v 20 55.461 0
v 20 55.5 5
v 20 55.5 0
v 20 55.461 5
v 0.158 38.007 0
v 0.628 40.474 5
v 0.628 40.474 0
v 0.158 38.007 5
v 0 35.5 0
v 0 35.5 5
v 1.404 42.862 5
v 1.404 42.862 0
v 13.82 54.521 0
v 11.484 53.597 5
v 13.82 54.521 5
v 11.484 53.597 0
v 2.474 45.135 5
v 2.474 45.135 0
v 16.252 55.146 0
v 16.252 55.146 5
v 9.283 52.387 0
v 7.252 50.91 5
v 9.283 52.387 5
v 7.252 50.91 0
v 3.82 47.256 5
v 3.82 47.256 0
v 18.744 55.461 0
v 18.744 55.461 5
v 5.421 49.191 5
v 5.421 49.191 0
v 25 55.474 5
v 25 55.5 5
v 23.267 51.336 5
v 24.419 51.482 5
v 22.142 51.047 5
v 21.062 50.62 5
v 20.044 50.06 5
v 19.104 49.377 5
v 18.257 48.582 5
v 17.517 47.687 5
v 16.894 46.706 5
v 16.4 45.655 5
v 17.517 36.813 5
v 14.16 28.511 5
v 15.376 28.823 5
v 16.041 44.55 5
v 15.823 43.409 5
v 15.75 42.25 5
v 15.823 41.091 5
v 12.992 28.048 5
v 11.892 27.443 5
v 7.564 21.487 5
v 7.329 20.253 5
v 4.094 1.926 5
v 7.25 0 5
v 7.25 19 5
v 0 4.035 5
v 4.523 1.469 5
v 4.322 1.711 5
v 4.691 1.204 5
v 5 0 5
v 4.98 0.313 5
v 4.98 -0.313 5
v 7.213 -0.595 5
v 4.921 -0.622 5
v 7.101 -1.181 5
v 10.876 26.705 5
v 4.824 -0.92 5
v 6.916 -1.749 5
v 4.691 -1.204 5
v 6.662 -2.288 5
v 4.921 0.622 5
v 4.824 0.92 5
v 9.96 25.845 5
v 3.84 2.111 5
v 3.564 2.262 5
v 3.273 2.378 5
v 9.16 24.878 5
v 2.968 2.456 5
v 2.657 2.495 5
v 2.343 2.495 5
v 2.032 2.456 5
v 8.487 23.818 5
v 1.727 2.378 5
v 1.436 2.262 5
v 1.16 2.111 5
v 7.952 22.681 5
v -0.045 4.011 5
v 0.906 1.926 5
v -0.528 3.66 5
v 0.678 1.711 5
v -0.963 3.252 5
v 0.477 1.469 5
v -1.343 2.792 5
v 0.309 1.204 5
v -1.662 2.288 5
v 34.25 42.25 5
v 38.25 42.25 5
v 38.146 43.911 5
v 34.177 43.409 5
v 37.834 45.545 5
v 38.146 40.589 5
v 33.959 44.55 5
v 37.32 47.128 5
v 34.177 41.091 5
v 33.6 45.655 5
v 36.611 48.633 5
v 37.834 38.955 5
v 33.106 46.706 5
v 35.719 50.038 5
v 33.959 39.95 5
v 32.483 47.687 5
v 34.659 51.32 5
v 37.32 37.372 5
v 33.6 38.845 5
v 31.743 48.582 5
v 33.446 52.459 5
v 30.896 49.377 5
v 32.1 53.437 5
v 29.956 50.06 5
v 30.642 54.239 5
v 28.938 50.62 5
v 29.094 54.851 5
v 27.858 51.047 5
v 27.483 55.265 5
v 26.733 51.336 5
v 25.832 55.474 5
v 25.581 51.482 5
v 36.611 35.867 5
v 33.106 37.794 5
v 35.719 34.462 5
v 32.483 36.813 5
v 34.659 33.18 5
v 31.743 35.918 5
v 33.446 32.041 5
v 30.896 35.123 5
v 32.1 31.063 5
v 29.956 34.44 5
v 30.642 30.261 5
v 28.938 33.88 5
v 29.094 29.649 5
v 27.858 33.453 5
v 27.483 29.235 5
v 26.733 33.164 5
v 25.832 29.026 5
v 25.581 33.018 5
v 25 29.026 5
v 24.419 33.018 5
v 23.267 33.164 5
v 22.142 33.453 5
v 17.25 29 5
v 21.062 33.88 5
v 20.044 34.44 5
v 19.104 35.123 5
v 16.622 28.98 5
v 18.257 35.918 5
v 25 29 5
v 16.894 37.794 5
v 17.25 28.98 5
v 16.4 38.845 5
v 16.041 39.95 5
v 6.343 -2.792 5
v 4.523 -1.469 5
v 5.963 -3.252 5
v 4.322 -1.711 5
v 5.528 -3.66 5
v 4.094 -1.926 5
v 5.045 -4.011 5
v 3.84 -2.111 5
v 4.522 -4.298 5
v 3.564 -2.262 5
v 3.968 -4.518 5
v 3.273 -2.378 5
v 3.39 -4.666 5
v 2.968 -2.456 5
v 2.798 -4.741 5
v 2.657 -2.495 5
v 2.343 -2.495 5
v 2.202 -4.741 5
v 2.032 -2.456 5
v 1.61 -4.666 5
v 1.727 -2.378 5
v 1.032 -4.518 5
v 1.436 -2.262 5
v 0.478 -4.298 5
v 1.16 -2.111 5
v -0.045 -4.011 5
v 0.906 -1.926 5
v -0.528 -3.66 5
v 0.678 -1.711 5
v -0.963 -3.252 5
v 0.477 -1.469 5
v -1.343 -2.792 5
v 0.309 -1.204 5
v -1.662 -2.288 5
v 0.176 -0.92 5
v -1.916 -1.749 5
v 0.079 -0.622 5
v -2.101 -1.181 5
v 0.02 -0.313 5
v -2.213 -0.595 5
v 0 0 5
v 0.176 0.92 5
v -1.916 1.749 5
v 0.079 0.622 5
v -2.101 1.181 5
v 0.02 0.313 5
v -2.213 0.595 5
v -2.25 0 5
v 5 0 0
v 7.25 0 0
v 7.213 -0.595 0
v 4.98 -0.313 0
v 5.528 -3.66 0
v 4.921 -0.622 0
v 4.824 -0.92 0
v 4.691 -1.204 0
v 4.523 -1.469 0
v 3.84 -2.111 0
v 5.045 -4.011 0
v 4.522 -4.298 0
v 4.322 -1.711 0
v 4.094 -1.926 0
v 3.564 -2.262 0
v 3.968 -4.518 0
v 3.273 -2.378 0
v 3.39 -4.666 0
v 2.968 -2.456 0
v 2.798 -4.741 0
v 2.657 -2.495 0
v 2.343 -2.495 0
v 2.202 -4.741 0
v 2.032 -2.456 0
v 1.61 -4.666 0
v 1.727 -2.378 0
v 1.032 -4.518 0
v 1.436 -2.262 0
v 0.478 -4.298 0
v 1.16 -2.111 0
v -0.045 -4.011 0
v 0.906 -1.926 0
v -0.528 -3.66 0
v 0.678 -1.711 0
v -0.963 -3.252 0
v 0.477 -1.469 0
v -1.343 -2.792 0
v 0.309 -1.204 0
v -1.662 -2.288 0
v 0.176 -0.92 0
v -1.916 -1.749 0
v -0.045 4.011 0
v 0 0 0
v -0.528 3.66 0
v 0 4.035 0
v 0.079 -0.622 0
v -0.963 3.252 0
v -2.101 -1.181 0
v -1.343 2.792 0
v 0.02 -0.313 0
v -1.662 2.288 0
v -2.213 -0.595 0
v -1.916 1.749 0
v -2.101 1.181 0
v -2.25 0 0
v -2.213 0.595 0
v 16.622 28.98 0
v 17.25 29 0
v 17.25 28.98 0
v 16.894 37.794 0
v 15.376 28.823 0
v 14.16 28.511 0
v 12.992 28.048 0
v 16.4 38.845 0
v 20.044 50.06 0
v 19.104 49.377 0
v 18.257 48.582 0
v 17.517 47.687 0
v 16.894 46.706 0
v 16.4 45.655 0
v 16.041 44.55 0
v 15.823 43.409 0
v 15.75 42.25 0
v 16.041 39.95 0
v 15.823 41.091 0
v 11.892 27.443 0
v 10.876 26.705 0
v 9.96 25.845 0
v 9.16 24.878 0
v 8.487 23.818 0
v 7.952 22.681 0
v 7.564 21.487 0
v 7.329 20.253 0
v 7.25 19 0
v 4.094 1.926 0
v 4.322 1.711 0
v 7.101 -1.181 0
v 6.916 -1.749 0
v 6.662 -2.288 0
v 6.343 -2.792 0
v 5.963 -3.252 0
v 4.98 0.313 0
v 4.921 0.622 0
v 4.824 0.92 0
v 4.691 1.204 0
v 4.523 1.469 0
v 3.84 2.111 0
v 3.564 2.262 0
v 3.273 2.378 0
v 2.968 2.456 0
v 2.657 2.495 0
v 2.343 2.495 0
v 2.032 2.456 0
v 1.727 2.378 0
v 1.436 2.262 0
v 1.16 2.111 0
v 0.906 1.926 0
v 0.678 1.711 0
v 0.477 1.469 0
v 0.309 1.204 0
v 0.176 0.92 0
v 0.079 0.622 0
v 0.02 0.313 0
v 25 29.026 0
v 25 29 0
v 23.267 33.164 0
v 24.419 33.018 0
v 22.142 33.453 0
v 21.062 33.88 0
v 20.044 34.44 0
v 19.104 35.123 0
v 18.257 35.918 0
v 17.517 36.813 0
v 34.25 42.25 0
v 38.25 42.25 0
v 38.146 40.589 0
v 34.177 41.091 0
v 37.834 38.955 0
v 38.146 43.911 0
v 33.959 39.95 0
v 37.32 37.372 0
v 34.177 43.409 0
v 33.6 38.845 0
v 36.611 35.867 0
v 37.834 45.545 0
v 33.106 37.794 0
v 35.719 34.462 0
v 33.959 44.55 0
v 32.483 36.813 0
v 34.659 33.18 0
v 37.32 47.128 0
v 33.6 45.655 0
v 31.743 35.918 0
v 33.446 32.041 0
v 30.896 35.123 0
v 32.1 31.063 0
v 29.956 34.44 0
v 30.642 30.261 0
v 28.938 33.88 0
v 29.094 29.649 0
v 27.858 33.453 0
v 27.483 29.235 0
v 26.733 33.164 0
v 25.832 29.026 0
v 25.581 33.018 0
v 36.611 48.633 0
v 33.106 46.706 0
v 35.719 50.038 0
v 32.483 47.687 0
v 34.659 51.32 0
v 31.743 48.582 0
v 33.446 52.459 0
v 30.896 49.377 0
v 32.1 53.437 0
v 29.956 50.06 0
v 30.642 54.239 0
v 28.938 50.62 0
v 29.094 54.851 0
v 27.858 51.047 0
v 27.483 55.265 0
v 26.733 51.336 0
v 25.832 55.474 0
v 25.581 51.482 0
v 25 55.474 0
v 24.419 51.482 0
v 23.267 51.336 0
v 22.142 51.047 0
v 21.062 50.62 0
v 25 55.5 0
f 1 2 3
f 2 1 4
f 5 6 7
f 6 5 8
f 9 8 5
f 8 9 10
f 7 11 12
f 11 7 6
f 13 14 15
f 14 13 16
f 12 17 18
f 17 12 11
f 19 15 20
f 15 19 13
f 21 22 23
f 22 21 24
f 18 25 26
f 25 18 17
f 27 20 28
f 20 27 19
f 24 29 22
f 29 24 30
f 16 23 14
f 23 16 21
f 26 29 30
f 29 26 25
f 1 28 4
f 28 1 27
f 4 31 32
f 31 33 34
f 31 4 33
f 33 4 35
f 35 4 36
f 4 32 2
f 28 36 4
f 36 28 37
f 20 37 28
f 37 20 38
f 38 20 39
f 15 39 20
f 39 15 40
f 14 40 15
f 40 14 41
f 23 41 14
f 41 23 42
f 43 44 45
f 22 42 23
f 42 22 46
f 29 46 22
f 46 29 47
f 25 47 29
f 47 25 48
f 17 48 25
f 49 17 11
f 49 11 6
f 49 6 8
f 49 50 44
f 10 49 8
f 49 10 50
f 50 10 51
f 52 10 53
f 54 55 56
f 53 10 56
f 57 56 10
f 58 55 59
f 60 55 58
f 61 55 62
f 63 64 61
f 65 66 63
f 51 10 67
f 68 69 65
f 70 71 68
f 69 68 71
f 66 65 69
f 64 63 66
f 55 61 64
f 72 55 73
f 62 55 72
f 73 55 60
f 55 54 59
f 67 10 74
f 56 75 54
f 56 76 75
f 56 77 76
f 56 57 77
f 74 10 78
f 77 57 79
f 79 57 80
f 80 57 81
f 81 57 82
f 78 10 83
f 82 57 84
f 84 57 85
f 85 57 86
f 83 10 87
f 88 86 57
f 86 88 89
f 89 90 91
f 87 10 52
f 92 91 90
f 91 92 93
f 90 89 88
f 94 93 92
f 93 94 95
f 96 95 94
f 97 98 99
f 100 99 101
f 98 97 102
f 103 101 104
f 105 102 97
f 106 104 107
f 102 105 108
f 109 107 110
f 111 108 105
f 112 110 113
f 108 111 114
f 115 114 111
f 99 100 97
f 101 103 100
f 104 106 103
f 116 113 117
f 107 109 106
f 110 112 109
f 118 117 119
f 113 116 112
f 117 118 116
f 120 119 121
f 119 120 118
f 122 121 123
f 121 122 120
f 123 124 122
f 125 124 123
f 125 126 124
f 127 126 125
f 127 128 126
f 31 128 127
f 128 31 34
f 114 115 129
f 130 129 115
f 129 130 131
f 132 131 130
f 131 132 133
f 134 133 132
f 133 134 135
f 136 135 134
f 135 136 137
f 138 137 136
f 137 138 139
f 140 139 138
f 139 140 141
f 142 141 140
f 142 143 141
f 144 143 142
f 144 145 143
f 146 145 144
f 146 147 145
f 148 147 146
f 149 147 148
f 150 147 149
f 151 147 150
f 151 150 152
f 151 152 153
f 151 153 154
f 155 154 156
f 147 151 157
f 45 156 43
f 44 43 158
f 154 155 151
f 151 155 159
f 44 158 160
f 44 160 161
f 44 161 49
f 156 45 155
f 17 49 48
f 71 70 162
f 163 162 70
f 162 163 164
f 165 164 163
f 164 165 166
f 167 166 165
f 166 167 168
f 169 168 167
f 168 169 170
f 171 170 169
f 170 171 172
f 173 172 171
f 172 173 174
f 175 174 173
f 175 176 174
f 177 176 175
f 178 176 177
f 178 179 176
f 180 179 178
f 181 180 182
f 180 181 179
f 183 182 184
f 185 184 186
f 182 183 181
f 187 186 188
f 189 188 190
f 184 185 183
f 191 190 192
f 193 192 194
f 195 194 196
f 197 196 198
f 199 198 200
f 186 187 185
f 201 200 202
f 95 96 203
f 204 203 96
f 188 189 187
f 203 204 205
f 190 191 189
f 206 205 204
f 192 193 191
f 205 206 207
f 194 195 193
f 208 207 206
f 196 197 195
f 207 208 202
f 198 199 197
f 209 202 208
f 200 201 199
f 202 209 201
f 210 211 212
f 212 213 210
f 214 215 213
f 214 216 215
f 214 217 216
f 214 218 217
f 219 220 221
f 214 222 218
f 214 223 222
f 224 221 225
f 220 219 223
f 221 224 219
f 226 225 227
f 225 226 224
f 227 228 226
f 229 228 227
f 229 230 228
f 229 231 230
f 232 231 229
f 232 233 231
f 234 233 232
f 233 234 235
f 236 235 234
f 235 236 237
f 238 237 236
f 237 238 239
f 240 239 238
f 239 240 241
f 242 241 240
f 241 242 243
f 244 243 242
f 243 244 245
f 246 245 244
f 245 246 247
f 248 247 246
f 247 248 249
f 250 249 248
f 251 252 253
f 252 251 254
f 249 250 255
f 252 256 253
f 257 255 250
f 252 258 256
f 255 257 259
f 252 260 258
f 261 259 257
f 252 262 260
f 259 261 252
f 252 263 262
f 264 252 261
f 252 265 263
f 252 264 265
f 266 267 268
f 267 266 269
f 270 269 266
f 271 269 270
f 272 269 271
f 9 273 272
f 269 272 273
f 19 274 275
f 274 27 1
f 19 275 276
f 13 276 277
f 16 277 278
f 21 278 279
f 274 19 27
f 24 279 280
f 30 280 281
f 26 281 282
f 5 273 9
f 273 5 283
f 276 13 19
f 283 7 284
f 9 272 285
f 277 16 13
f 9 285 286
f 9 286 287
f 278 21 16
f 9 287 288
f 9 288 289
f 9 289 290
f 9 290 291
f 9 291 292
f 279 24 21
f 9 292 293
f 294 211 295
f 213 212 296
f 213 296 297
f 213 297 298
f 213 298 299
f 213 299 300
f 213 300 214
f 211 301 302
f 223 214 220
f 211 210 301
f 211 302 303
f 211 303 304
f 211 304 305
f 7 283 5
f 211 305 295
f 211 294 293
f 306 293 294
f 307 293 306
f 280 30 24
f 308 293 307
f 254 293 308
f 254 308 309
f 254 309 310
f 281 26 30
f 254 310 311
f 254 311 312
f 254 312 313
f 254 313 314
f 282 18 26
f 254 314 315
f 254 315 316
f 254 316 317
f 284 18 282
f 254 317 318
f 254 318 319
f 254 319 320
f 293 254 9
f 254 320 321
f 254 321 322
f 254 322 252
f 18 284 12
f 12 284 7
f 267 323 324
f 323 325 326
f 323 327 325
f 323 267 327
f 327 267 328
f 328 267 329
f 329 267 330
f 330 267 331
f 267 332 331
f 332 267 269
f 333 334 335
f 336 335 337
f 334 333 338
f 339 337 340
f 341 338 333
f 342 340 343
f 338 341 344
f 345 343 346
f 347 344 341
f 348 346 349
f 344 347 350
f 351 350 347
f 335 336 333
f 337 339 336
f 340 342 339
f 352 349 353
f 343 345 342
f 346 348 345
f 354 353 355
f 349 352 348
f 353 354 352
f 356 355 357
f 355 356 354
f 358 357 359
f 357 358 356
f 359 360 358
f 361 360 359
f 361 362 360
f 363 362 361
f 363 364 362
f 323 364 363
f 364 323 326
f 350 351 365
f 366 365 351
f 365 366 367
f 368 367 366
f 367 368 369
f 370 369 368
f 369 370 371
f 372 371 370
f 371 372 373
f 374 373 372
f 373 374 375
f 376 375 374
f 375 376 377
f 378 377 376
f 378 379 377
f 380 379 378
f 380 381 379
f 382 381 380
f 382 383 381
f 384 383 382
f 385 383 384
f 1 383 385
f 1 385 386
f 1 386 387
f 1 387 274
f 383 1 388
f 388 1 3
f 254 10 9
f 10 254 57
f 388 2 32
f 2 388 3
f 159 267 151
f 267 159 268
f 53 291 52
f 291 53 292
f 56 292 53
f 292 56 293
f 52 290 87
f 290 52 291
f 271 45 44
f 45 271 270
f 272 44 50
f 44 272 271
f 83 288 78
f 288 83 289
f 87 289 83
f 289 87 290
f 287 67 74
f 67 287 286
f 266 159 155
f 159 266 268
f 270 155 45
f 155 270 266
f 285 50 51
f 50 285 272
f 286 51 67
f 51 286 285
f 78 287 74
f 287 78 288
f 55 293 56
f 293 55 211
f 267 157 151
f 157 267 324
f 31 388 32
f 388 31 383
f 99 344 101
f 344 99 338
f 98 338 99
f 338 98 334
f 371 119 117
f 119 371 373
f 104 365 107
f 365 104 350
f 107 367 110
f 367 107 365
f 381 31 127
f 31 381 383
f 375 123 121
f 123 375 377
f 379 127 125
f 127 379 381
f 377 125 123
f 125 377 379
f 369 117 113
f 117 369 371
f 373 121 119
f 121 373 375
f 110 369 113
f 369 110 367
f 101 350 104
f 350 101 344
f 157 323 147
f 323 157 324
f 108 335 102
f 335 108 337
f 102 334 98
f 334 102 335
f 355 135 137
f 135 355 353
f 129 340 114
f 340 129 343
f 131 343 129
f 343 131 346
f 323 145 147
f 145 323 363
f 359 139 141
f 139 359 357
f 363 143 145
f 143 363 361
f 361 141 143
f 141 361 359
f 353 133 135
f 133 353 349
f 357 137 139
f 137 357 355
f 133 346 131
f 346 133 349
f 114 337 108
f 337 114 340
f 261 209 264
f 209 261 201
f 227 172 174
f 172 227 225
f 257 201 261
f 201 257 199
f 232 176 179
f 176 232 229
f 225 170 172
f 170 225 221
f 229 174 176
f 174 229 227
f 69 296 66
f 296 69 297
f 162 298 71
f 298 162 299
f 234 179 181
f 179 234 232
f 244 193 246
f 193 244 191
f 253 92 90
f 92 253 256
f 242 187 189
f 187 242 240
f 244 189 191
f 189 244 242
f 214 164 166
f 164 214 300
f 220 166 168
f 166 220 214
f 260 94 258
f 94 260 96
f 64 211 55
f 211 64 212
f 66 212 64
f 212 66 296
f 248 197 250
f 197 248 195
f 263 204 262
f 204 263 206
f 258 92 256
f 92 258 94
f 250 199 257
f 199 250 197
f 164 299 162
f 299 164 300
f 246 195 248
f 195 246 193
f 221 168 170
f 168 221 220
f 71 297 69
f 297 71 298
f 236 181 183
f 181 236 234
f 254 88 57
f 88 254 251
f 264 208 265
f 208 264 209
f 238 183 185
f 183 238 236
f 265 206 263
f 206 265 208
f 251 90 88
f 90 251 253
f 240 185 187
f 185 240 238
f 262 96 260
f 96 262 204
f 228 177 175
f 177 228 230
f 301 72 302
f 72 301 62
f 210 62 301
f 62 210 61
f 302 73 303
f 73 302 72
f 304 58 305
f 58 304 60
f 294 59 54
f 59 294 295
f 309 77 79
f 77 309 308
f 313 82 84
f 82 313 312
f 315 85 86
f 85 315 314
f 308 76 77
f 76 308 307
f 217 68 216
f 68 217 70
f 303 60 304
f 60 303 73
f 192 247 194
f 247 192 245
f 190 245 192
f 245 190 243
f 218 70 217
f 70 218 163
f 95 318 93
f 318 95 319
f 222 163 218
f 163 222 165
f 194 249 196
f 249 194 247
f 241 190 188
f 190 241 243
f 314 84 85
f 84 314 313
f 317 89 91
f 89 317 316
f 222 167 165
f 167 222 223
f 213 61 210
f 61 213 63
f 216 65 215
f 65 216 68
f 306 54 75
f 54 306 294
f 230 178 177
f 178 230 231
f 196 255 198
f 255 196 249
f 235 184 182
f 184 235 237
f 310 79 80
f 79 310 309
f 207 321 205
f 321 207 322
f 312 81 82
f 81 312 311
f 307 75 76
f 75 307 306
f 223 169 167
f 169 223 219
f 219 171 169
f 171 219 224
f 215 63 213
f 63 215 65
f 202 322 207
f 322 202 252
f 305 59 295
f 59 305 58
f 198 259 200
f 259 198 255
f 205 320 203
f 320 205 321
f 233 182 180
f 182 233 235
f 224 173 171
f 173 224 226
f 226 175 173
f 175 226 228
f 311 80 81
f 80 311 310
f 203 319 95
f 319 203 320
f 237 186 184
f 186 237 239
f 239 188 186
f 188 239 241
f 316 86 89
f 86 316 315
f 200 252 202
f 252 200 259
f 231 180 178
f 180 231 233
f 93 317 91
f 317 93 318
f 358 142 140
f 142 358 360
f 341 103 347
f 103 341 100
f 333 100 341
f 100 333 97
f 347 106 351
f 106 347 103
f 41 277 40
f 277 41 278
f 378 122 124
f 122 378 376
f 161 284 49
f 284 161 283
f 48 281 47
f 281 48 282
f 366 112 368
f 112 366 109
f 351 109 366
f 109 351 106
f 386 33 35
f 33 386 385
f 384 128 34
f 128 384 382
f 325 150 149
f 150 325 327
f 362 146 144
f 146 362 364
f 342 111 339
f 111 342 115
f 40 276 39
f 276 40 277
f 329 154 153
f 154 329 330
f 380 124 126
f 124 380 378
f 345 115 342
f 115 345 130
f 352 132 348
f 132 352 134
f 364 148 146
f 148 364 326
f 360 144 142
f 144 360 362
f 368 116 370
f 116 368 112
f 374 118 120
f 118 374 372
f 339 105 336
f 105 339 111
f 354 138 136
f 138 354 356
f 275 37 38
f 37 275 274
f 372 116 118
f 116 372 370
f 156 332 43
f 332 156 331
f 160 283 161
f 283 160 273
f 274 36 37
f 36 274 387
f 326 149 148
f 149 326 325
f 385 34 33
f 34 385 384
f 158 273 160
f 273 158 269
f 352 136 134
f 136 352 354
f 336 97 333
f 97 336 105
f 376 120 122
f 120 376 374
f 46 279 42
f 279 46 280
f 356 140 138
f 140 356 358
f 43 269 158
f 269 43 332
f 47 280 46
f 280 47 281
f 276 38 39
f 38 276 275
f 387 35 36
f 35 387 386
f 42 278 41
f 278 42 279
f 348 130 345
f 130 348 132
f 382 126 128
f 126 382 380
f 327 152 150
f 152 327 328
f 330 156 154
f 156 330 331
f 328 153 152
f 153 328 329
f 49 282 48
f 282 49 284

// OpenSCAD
$fn=50;
//Shape size
inradius      = 10;
outradius     = 20;
// size of the biggest ring
lengthBigRing = 4;
// size of the smallest ring
lengthSmaRing = 2.25;
// diameter of the capter
probediam     = 18;
tolerance     = 0.5;
//thickness
thickness     = 5;
// hole radius
bolt_hole     = 2.5;
// Probe offset from screw
yoffset       = 29 ;
// Probe offset from screw
xoffset       = 25;

// Please note, in Marlin the offsets should be
// X_PROBE_OFFSET_FROM_EXTRUDER  0
// Y_PROBE_OFFSET_FROM_EXTRUDER  -yoffset (default = 40.25)

module cutter(r,height){
     difference(){
      cube([r+5,r+5,2.5*height]);
      cylinder(h=6*height,r=r,center=true);
     }//difference
   }
module cube_left_round(width, depth, height, r){ 
  difference() {
    cube([width, depth, height]);
    translate([r, depth-r,-height]) mirror([1,0,0]) cutter(r,height);
  }//difference
}//module

module probe_holder(thickness=thickness, inradius=inradius, outradius=outradius, 
  xoffset = xoffset, yoffset=yoffset, probediam=probediam+tolerance){
  width = xoffset + probediam/2 + lengthBigRing;
  depth = yoffset + probediam + 2*lengthBigRing;
  
  yprobe = yoffset + probediam/2 + lengthBigRing;
  xprobe = xoffset;
  //yoffset = 29 + lengthBigRing + (probediam+tolerance)/2 ;
    
  difference(){
    //shape
    union(){
      difference(){
        cube_left_round(width, depth, thickness, outradius);
        translate([2*bolt_hole+lengthSmaRing,-2,-thickness])
          cube_left_round(width, yoffset+2, 2.5*thickness, inradius);
        translate([xoffset,yprobe,-thickness])
          cutter(r=probediam/2+lengthBigRing, height=2.5*thickness);
        translate([xoffset,yprobe,-thickness])
          mirror([0,1,0])cutter(r=probediam/2+lengthBigRing, height=2.5*thickness);
      }//difference
      translate([bolt_hole,0,thickness/2])cylinder(h=thickness,r=bolt_hole+lengthSmaRing,center=true);
    }//union
    // Make hole
    translate([bolt_hole,0,0])cylinder(h=3*thickness,r=bolt_hole,center=true);
    translate([xoffset,yprobe,0])cylinder(h=3*thickness,d=probediam,center=true);
  }//difference
}//module

probe_holder();
